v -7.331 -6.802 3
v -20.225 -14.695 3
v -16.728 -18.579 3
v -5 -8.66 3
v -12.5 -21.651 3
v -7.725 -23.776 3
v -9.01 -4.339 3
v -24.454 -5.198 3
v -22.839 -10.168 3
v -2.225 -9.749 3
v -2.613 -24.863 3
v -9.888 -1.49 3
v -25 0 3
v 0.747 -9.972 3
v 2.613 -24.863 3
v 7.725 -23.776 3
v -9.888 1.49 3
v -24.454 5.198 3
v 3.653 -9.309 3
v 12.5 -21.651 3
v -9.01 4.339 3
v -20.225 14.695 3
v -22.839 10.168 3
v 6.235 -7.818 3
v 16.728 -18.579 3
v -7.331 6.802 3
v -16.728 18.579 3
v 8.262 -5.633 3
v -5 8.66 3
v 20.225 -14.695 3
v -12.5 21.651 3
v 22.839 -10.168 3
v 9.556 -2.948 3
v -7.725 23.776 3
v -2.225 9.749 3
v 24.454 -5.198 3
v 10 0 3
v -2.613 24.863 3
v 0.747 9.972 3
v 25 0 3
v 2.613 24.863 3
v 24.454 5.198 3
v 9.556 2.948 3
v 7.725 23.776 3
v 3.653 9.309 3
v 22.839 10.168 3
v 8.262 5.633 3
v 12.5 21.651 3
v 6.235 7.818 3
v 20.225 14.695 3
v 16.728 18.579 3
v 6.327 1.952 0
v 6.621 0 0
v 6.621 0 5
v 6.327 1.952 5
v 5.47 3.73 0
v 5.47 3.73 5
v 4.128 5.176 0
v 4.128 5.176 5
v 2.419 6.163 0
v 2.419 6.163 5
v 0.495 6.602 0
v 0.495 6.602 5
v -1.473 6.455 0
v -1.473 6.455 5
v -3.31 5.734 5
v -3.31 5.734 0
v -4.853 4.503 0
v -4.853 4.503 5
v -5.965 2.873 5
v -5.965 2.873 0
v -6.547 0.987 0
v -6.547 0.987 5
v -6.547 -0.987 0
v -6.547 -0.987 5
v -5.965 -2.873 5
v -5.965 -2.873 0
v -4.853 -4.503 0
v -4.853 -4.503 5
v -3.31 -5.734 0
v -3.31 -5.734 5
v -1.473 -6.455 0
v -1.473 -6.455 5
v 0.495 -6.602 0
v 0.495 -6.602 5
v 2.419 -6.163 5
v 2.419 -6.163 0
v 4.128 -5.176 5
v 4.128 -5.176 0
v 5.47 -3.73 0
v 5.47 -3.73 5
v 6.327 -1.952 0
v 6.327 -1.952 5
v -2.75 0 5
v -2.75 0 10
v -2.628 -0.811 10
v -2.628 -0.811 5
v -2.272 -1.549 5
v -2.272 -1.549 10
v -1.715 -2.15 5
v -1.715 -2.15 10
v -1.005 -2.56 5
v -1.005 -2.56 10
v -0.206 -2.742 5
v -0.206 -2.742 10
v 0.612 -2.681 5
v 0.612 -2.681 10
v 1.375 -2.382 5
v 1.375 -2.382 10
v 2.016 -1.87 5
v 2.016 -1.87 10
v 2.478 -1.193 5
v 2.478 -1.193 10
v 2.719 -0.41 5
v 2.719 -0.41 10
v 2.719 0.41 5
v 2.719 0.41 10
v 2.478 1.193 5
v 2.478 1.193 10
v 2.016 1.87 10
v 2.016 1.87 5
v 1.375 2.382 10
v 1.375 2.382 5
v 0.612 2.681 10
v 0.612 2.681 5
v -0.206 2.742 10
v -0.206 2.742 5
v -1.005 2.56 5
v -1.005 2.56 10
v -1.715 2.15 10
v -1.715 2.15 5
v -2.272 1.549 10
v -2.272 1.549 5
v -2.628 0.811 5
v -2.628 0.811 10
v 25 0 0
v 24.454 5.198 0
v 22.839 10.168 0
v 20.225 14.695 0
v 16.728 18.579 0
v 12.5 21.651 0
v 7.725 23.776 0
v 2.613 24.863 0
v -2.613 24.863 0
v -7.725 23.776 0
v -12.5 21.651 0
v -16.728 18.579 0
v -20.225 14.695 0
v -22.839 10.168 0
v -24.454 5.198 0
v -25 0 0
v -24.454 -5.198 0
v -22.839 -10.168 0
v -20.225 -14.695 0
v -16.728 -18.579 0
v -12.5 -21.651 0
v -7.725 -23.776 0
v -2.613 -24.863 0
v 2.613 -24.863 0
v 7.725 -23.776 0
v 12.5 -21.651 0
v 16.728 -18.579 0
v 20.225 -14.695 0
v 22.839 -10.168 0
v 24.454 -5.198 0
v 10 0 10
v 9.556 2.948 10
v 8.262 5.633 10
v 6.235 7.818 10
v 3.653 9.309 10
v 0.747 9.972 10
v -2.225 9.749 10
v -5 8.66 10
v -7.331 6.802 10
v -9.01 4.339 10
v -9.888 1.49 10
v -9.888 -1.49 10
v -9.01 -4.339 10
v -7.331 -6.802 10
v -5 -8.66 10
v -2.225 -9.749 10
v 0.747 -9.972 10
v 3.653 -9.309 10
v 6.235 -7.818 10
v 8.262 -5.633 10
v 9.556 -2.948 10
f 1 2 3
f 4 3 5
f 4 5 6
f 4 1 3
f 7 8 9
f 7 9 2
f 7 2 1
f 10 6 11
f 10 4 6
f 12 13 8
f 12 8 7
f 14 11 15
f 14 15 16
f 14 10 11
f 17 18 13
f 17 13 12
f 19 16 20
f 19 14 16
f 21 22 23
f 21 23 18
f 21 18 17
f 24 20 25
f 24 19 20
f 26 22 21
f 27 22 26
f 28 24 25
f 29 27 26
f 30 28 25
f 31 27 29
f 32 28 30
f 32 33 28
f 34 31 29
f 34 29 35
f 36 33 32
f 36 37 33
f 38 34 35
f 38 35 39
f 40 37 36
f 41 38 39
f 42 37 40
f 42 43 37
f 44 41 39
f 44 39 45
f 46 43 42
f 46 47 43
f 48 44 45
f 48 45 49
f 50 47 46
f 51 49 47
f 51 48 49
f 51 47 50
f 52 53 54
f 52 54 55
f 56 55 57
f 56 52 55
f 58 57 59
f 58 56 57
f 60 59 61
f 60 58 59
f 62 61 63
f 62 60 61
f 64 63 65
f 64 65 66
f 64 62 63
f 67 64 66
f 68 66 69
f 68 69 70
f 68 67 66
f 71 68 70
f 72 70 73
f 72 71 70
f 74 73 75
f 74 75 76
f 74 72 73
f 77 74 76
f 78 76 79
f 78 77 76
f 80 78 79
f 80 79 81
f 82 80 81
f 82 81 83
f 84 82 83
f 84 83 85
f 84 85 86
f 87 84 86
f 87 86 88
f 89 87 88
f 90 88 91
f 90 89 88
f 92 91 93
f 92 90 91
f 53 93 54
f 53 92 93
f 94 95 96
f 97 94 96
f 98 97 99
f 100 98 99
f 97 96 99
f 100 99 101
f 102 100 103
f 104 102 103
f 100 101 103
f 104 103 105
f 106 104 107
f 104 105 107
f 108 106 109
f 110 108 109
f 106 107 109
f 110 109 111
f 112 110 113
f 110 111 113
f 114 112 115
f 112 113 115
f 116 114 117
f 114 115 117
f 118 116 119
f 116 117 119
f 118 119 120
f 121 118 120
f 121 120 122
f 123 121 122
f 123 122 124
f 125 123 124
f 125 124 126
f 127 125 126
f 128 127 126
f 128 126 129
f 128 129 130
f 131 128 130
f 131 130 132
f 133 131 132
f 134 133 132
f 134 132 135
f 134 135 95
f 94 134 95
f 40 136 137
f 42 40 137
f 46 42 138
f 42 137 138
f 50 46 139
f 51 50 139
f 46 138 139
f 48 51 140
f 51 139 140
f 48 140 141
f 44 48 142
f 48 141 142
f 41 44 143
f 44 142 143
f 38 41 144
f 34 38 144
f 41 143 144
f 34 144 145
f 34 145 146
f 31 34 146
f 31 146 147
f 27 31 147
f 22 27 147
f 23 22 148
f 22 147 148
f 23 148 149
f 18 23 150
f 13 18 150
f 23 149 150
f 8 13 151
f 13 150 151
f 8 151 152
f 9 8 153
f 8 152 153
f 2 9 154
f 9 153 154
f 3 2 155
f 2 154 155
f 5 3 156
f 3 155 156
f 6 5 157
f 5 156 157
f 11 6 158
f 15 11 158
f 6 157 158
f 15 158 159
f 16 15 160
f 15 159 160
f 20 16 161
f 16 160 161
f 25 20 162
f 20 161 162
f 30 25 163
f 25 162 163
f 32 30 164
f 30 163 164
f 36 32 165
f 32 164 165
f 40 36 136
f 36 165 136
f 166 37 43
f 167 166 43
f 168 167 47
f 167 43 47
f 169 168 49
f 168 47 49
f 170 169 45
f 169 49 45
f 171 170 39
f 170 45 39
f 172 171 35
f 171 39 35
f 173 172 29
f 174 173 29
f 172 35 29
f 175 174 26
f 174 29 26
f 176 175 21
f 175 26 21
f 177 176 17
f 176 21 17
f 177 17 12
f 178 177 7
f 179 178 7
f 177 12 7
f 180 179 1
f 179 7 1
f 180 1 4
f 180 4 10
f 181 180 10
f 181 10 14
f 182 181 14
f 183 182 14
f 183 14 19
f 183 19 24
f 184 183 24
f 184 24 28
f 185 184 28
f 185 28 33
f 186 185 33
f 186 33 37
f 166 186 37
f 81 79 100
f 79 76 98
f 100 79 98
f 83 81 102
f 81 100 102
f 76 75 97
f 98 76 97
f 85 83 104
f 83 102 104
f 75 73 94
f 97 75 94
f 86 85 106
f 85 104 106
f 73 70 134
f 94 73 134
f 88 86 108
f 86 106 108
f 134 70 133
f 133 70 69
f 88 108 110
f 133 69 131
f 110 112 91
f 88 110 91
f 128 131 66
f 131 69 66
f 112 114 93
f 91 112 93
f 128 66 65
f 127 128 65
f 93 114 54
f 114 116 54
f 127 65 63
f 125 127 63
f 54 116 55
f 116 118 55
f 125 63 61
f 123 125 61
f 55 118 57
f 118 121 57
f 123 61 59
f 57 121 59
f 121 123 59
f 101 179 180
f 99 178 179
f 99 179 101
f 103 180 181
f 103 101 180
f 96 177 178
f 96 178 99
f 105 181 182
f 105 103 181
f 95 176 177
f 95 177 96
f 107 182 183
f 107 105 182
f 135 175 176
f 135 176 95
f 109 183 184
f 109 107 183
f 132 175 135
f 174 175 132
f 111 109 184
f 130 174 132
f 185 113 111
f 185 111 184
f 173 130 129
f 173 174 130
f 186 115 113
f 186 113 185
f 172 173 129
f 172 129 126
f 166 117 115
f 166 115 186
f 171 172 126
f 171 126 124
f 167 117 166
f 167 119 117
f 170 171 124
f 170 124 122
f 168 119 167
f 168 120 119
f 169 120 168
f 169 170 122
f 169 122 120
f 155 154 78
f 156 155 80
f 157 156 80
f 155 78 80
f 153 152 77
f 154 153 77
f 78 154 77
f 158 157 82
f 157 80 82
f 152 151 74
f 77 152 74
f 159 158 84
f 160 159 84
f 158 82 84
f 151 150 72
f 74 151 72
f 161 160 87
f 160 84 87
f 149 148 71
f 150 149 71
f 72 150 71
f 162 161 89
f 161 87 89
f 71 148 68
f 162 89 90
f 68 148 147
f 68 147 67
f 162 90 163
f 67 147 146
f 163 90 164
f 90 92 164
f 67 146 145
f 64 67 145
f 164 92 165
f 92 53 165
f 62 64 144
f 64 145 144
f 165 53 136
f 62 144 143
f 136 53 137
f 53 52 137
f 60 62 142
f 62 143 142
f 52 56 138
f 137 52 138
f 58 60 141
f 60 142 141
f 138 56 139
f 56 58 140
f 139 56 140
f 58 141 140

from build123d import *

# Parameters (mm, degrees)
F0_R     = 25
F0_R_2   = 10
F1_DEPTH = 3
F2_DEPTH = 10
F3_D     = 5.5
F3_DEPTH = 30
F3_TIP   = 1.6523667023
F4_R     = 6.6209049639
F5_DEPTH = 5


with BuildPart() as f1:
    # F0 (on Top) → F1 (new body)
    with BuildSketch(Plane.XY):
        Circle(F0_R)
        Circle(F0_R_2, mode=Mode.SUBTRACT)
        Circle(F0_R_2)
    extrude(amount=F1_DEPTH)

    # F0 (on Top) → F2 (join)
    with BuildSketch(Plane.XY):
        Circle(F0_R_2)
    extrude(amount=F2_DEPTH)

    # F3
    with Locations(Plane(origin=(0, 0, 0), x_dir=(1, 0, 0), z_dir=(0, 0, -1))):
        with Locations((0, 0)):
            Hole(F3_D / 2, depth=F3_DEPTH)
            with Locations((0, 0, -(F3_DEPTH + F3_TIP / 2))):  # 118° drill point
                Cone(0, F3_D / 2, F3_TIP, mode=Mode.SUBTRACT)

    # F4 (on face) → F5 (cut)
    with BuildSketch(Plane.XY):
        Circle(F4_R)
        Polygon((-4.8497422612, 0), (-2.4248711306, 4.2), (2.4248711306, 4.2), (4.8497422612, 0), (2.4248711306, -4.2), (-2.4248711306, -4.2), align=None, mode=Mode.SUBTRACT)
        Polygon((2.4248711306, 4.2), (-2.4248711306, 4.2), (-4.8497422612, 0), (-2.4248711306, -4.2), (2.4248711306, -4.2), (4.8497422612, 0), align=None)
    extrude(amount=F5_DEPTH, mode=Mode.SUBTRACT)


solid = f1.part
